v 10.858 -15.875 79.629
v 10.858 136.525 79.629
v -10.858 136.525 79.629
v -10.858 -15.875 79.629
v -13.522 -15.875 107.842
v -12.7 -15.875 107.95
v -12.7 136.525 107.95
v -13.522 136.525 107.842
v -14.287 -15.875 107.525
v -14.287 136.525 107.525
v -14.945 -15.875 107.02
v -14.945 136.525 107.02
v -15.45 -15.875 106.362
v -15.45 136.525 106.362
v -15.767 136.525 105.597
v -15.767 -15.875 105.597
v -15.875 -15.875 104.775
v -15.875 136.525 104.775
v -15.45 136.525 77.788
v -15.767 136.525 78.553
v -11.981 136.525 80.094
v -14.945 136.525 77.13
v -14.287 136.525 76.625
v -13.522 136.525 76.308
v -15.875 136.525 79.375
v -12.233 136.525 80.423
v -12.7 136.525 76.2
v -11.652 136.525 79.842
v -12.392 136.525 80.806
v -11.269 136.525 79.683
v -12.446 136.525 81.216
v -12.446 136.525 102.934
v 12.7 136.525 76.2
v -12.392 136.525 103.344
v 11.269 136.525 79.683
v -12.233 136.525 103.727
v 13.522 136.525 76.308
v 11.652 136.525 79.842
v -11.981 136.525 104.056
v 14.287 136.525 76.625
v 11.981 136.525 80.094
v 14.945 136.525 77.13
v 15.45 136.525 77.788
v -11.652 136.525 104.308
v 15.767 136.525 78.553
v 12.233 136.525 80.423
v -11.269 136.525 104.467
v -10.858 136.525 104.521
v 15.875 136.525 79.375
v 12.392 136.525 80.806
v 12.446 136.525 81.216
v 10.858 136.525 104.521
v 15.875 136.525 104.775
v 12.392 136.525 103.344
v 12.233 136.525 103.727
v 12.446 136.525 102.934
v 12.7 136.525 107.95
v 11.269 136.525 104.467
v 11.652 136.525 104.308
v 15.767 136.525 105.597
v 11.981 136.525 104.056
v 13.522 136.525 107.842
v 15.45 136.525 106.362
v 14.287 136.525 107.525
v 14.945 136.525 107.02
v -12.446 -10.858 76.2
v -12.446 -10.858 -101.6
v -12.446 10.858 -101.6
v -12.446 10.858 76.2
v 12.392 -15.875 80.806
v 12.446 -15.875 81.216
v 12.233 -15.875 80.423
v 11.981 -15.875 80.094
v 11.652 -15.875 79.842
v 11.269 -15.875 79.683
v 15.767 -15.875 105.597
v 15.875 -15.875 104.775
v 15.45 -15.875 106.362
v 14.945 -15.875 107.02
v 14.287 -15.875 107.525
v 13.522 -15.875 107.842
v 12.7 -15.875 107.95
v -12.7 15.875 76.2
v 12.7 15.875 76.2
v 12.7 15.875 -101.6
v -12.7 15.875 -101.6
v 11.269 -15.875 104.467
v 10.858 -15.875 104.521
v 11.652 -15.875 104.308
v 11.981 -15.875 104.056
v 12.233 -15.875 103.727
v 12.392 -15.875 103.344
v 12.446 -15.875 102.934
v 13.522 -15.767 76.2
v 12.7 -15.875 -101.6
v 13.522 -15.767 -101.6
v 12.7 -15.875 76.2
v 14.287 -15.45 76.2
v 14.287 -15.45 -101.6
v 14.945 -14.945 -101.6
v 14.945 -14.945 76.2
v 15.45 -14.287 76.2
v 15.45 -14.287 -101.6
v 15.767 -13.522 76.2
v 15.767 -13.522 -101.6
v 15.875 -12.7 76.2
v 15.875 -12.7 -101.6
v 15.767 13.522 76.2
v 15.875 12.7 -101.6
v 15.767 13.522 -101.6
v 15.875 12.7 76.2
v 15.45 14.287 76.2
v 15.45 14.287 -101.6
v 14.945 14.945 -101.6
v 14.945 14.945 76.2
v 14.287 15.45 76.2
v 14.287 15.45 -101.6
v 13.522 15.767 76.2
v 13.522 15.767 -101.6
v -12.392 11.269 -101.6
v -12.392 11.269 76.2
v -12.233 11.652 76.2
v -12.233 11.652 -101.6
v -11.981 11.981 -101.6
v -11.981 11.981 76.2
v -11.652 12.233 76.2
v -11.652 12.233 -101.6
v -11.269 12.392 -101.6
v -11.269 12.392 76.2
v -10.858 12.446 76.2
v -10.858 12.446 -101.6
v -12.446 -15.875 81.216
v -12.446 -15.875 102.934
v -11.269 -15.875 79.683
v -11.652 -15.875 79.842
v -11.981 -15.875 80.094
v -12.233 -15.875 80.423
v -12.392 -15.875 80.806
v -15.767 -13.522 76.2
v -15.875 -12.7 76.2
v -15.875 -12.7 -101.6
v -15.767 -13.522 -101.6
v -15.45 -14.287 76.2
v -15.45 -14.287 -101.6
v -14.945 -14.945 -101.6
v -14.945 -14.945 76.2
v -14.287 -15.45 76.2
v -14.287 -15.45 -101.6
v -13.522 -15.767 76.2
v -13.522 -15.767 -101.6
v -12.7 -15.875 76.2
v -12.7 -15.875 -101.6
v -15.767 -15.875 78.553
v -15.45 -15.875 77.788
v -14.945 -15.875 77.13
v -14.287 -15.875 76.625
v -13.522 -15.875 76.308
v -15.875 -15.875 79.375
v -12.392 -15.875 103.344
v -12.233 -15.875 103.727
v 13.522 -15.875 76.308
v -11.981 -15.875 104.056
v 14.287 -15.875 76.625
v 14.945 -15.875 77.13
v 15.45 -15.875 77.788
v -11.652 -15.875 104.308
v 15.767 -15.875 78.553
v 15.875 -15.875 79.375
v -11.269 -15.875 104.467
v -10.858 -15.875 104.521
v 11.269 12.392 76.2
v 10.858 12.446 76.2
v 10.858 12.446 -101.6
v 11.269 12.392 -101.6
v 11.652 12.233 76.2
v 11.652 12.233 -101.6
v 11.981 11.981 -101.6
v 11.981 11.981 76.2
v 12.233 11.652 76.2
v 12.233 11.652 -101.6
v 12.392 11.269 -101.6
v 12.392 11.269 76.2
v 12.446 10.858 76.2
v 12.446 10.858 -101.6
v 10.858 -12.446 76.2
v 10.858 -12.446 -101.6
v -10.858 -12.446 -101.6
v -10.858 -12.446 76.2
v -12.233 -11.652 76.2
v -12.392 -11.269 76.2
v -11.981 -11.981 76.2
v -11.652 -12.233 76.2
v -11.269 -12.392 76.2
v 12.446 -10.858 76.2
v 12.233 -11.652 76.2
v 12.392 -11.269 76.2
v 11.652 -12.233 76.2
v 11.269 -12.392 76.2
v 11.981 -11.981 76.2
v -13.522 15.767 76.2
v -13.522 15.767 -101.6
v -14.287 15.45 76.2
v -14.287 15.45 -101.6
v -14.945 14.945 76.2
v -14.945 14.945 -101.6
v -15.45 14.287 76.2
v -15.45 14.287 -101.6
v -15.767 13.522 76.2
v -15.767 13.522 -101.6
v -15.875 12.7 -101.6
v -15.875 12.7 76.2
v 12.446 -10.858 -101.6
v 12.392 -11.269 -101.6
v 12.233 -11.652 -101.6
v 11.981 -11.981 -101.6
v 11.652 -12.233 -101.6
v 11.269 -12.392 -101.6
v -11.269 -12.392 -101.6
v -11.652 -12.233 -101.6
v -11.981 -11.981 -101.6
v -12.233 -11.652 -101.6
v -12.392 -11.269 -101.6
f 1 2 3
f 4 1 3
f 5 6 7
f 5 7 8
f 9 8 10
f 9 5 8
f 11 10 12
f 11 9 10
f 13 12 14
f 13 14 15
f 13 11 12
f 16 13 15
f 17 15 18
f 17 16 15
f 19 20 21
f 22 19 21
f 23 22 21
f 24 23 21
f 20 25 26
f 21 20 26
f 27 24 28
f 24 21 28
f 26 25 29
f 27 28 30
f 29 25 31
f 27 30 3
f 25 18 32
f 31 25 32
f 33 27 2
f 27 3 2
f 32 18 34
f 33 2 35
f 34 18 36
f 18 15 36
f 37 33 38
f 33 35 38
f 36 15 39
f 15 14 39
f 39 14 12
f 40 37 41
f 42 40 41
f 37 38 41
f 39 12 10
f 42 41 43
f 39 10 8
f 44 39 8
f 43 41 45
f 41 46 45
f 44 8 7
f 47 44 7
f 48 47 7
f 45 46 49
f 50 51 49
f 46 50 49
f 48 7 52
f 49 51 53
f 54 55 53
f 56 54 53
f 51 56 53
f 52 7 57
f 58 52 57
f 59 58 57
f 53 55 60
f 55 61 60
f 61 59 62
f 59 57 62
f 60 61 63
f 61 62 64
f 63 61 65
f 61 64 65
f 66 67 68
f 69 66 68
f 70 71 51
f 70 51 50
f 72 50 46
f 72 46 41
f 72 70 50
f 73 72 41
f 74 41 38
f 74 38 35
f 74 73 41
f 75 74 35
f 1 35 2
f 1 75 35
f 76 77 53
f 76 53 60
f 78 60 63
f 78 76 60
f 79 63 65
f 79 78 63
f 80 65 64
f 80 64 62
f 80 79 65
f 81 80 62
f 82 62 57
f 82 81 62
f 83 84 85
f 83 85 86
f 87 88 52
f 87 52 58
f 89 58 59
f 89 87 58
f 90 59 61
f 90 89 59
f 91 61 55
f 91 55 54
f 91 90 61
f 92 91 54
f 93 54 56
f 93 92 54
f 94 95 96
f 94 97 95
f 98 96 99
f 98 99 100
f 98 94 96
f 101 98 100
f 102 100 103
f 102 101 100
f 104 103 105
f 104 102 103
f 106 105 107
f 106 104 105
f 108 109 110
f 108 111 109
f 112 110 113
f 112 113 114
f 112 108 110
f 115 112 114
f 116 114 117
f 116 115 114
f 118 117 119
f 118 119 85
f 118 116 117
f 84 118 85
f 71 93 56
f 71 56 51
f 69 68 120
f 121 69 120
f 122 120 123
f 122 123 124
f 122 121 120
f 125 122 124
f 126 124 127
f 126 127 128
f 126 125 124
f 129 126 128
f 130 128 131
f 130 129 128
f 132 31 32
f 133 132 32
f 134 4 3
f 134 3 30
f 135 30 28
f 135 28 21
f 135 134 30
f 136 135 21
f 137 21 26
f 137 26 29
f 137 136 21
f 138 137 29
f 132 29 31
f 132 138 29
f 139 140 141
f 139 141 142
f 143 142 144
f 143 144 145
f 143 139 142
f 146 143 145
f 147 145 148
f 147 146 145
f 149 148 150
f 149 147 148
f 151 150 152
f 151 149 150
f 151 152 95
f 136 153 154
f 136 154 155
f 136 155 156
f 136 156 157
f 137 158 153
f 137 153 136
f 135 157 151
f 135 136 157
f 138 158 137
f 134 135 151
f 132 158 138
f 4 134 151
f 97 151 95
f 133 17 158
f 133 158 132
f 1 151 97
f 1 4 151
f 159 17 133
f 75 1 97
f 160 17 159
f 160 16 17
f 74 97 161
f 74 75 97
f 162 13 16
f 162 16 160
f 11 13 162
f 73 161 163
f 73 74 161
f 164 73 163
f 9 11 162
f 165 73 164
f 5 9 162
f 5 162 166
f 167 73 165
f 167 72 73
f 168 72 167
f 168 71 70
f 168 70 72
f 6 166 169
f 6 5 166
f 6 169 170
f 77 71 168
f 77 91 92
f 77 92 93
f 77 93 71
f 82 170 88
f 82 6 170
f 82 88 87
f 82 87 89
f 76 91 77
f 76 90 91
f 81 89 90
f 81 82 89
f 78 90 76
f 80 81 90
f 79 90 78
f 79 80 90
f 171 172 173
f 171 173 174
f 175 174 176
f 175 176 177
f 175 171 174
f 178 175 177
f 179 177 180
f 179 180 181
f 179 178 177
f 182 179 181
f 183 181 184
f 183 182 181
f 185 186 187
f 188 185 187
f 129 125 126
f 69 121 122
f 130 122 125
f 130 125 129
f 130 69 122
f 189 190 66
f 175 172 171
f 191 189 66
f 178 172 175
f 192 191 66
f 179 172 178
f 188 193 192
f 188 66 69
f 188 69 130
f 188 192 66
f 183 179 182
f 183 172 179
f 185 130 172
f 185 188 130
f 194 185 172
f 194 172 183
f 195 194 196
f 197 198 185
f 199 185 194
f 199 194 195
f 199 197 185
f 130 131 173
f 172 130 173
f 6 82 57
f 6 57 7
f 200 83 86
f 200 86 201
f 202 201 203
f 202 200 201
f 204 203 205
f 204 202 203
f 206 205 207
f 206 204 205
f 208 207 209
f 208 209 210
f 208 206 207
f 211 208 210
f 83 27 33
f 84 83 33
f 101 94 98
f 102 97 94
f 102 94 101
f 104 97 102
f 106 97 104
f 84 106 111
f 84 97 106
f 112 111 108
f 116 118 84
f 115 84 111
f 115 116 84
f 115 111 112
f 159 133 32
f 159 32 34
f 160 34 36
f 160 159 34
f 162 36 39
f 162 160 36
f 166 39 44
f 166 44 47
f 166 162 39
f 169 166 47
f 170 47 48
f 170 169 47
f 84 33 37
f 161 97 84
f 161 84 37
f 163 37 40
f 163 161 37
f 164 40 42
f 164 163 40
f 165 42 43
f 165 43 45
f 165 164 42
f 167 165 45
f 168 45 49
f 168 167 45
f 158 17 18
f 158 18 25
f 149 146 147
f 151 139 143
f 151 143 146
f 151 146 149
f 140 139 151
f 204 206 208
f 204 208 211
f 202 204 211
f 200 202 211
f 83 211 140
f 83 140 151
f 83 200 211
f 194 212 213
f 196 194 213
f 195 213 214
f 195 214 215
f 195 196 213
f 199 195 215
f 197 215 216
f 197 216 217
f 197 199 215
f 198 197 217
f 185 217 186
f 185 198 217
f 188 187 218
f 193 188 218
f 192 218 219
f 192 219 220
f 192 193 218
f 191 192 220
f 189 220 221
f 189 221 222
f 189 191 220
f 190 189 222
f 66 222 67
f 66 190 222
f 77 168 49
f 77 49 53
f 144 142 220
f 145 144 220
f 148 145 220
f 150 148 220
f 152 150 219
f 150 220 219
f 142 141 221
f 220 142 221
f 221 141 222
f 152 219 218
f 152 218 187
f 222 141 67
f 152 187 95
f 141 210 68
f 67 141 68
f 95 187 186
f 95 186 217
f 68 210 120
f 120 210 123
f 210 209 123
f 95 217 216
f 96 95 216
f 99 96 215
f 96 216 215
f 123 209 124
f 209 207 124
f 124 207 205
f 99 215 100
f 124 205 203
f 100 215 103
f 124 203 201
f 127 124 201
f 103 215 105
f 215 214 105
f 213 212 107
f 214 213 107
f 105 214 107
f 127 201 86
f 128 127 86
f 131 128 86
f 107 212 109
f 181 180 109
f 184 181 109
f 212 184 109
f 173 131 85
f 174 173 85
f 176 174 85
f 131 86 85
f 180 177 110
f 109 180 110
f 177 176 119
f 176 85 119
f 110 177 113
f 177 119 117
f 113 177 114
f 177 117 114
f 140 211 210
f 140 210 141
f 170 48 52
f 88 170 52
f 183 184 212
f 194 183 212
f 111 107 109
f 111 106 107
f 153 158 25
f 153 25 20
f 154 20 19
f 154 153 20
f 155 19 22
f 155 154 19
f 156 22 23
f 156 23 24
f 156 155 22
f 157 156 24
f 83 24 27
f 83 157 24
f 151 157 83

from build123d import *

# Parameters (mm, degrees)
F1_DEPTH      = 76.2
F1_DEPTH_BACK = 101.6
F3_DEPTH      = 152.4


with BuildPart() as f1:
    # F0 (on Top) → F1 (new body, two sides)
    with BuildSketch(Plane.XY) as f1_sk:
        with BuildLine():
            ThreePointArc((15.875, 12.7), (14.945064, 14.945064), (12.7, 15.875))
            Line((12.7, 15.875), (-12.7, 15.875))
            ThreePointArc((-12.7, 15.875), (-14.945064, 14.945064), (-15.875, 12.7))
            Line((-15.875, 12.7), (-15.875, -12.7))
            ThreePointArc((-15.875, -12.7), (-14.945064, -14.945064), (-12.7, -15.875))
            Line((-12.7, -15.875), (12.7, -15.875))
            ThreePointArc((12.7, -15.875), (14.945064, -14.945064), (15.875, -12.7))
            Line((15.875, -12.7), (15.875, 12.7))
        make_face()
        with BuildLine():
            ThreePointArc((10.8585, 12.446), (11.981032, 11.981032), (12.446, 10.8585))
            Line((12.446, 10.8585), (12.446, -10.8585))
            ThreePointArc((12.446, -10.8585), (11.981032, -11.981032), (10.8585, -12.446))
            Line((10.8585, -12.446), (-10.8585, -12.446))
            ThreePointArc((-10.8585, -12.446), (-11.981032, -11.981032), (-12.446, -10.8585))
            Line((-12.446, -10.8585), (-12.446, 10.8585))
            ThreePointArc((-12.446, 10.8585), (-11.981032, 11.981032), (-10.8585, 12.446))
            Line((-10.8585, 12.446), (10.8585, 12.446))
        make_face(mode=Mode.SUBTRACT)
    extrude(amount=F1_DEPTH)
    extrude(f1_sk.sketch, amount=-F1_DEPTH_BACK)

    # F2 (on face) → F3 (join)
    with BuildSketch(Plane.XZ.offset(15.875)):
        with BuildLine():
            Line((-12.7, 76.2), (12.7, 76.2))
            ThreePointArc((12.7, 76.2), (14.945064, 77.129936), (15.875, 79.375))
            Line((15.875, 79.375), (15.875, 104.775))
            ThreePointArc((15.875, 104.775), (14.945064, 107.020064), (12.7, 107.95))
            Line((12.7, 107.95), (-12.7, 107.95))
            ThreePointArc((-12.7, 107.95), (-14.945064, 107.020064), (-15.875, 104.775))
            Line((-15.875, 104.775), (-15.875, 79.375))
            ThreePointArc((-15.875, 79.375), (-14.945064, 77.129936), (-12.7, 76.2))
        make_face()
        with BuildLine():
            Line((-12.446, 81.2165), (-12.446, 102.9335))
            ThreePointArc((-12.446, 102.9335), (-11.981032, 104.056032), (-10.8585, 104.521))
            Line((-10.8585, 104.521), (10.8585, 104.521))
            ThreePointArc((10.8585, 104.521), (11.981032, 104.056032), (12.446, 102.9335))
            Line((12.446, 102.9335), (12.446, 81.2165))
            ThreePointArc((12.446, 81.2165), (11.981032, 80.093968), (10.8585, 79.629))
            Line((10.8585, 79.629), (-10.8585, 79.629))
            ThreePointArc((-10.8585, 79.629), (-11.981032, 80.093968), (-12.446, 81.2165))
        make_face(mode=Mode.SUBTRACT)
    extrude(amount=-F3_DEPTH)


solid = f1.part
